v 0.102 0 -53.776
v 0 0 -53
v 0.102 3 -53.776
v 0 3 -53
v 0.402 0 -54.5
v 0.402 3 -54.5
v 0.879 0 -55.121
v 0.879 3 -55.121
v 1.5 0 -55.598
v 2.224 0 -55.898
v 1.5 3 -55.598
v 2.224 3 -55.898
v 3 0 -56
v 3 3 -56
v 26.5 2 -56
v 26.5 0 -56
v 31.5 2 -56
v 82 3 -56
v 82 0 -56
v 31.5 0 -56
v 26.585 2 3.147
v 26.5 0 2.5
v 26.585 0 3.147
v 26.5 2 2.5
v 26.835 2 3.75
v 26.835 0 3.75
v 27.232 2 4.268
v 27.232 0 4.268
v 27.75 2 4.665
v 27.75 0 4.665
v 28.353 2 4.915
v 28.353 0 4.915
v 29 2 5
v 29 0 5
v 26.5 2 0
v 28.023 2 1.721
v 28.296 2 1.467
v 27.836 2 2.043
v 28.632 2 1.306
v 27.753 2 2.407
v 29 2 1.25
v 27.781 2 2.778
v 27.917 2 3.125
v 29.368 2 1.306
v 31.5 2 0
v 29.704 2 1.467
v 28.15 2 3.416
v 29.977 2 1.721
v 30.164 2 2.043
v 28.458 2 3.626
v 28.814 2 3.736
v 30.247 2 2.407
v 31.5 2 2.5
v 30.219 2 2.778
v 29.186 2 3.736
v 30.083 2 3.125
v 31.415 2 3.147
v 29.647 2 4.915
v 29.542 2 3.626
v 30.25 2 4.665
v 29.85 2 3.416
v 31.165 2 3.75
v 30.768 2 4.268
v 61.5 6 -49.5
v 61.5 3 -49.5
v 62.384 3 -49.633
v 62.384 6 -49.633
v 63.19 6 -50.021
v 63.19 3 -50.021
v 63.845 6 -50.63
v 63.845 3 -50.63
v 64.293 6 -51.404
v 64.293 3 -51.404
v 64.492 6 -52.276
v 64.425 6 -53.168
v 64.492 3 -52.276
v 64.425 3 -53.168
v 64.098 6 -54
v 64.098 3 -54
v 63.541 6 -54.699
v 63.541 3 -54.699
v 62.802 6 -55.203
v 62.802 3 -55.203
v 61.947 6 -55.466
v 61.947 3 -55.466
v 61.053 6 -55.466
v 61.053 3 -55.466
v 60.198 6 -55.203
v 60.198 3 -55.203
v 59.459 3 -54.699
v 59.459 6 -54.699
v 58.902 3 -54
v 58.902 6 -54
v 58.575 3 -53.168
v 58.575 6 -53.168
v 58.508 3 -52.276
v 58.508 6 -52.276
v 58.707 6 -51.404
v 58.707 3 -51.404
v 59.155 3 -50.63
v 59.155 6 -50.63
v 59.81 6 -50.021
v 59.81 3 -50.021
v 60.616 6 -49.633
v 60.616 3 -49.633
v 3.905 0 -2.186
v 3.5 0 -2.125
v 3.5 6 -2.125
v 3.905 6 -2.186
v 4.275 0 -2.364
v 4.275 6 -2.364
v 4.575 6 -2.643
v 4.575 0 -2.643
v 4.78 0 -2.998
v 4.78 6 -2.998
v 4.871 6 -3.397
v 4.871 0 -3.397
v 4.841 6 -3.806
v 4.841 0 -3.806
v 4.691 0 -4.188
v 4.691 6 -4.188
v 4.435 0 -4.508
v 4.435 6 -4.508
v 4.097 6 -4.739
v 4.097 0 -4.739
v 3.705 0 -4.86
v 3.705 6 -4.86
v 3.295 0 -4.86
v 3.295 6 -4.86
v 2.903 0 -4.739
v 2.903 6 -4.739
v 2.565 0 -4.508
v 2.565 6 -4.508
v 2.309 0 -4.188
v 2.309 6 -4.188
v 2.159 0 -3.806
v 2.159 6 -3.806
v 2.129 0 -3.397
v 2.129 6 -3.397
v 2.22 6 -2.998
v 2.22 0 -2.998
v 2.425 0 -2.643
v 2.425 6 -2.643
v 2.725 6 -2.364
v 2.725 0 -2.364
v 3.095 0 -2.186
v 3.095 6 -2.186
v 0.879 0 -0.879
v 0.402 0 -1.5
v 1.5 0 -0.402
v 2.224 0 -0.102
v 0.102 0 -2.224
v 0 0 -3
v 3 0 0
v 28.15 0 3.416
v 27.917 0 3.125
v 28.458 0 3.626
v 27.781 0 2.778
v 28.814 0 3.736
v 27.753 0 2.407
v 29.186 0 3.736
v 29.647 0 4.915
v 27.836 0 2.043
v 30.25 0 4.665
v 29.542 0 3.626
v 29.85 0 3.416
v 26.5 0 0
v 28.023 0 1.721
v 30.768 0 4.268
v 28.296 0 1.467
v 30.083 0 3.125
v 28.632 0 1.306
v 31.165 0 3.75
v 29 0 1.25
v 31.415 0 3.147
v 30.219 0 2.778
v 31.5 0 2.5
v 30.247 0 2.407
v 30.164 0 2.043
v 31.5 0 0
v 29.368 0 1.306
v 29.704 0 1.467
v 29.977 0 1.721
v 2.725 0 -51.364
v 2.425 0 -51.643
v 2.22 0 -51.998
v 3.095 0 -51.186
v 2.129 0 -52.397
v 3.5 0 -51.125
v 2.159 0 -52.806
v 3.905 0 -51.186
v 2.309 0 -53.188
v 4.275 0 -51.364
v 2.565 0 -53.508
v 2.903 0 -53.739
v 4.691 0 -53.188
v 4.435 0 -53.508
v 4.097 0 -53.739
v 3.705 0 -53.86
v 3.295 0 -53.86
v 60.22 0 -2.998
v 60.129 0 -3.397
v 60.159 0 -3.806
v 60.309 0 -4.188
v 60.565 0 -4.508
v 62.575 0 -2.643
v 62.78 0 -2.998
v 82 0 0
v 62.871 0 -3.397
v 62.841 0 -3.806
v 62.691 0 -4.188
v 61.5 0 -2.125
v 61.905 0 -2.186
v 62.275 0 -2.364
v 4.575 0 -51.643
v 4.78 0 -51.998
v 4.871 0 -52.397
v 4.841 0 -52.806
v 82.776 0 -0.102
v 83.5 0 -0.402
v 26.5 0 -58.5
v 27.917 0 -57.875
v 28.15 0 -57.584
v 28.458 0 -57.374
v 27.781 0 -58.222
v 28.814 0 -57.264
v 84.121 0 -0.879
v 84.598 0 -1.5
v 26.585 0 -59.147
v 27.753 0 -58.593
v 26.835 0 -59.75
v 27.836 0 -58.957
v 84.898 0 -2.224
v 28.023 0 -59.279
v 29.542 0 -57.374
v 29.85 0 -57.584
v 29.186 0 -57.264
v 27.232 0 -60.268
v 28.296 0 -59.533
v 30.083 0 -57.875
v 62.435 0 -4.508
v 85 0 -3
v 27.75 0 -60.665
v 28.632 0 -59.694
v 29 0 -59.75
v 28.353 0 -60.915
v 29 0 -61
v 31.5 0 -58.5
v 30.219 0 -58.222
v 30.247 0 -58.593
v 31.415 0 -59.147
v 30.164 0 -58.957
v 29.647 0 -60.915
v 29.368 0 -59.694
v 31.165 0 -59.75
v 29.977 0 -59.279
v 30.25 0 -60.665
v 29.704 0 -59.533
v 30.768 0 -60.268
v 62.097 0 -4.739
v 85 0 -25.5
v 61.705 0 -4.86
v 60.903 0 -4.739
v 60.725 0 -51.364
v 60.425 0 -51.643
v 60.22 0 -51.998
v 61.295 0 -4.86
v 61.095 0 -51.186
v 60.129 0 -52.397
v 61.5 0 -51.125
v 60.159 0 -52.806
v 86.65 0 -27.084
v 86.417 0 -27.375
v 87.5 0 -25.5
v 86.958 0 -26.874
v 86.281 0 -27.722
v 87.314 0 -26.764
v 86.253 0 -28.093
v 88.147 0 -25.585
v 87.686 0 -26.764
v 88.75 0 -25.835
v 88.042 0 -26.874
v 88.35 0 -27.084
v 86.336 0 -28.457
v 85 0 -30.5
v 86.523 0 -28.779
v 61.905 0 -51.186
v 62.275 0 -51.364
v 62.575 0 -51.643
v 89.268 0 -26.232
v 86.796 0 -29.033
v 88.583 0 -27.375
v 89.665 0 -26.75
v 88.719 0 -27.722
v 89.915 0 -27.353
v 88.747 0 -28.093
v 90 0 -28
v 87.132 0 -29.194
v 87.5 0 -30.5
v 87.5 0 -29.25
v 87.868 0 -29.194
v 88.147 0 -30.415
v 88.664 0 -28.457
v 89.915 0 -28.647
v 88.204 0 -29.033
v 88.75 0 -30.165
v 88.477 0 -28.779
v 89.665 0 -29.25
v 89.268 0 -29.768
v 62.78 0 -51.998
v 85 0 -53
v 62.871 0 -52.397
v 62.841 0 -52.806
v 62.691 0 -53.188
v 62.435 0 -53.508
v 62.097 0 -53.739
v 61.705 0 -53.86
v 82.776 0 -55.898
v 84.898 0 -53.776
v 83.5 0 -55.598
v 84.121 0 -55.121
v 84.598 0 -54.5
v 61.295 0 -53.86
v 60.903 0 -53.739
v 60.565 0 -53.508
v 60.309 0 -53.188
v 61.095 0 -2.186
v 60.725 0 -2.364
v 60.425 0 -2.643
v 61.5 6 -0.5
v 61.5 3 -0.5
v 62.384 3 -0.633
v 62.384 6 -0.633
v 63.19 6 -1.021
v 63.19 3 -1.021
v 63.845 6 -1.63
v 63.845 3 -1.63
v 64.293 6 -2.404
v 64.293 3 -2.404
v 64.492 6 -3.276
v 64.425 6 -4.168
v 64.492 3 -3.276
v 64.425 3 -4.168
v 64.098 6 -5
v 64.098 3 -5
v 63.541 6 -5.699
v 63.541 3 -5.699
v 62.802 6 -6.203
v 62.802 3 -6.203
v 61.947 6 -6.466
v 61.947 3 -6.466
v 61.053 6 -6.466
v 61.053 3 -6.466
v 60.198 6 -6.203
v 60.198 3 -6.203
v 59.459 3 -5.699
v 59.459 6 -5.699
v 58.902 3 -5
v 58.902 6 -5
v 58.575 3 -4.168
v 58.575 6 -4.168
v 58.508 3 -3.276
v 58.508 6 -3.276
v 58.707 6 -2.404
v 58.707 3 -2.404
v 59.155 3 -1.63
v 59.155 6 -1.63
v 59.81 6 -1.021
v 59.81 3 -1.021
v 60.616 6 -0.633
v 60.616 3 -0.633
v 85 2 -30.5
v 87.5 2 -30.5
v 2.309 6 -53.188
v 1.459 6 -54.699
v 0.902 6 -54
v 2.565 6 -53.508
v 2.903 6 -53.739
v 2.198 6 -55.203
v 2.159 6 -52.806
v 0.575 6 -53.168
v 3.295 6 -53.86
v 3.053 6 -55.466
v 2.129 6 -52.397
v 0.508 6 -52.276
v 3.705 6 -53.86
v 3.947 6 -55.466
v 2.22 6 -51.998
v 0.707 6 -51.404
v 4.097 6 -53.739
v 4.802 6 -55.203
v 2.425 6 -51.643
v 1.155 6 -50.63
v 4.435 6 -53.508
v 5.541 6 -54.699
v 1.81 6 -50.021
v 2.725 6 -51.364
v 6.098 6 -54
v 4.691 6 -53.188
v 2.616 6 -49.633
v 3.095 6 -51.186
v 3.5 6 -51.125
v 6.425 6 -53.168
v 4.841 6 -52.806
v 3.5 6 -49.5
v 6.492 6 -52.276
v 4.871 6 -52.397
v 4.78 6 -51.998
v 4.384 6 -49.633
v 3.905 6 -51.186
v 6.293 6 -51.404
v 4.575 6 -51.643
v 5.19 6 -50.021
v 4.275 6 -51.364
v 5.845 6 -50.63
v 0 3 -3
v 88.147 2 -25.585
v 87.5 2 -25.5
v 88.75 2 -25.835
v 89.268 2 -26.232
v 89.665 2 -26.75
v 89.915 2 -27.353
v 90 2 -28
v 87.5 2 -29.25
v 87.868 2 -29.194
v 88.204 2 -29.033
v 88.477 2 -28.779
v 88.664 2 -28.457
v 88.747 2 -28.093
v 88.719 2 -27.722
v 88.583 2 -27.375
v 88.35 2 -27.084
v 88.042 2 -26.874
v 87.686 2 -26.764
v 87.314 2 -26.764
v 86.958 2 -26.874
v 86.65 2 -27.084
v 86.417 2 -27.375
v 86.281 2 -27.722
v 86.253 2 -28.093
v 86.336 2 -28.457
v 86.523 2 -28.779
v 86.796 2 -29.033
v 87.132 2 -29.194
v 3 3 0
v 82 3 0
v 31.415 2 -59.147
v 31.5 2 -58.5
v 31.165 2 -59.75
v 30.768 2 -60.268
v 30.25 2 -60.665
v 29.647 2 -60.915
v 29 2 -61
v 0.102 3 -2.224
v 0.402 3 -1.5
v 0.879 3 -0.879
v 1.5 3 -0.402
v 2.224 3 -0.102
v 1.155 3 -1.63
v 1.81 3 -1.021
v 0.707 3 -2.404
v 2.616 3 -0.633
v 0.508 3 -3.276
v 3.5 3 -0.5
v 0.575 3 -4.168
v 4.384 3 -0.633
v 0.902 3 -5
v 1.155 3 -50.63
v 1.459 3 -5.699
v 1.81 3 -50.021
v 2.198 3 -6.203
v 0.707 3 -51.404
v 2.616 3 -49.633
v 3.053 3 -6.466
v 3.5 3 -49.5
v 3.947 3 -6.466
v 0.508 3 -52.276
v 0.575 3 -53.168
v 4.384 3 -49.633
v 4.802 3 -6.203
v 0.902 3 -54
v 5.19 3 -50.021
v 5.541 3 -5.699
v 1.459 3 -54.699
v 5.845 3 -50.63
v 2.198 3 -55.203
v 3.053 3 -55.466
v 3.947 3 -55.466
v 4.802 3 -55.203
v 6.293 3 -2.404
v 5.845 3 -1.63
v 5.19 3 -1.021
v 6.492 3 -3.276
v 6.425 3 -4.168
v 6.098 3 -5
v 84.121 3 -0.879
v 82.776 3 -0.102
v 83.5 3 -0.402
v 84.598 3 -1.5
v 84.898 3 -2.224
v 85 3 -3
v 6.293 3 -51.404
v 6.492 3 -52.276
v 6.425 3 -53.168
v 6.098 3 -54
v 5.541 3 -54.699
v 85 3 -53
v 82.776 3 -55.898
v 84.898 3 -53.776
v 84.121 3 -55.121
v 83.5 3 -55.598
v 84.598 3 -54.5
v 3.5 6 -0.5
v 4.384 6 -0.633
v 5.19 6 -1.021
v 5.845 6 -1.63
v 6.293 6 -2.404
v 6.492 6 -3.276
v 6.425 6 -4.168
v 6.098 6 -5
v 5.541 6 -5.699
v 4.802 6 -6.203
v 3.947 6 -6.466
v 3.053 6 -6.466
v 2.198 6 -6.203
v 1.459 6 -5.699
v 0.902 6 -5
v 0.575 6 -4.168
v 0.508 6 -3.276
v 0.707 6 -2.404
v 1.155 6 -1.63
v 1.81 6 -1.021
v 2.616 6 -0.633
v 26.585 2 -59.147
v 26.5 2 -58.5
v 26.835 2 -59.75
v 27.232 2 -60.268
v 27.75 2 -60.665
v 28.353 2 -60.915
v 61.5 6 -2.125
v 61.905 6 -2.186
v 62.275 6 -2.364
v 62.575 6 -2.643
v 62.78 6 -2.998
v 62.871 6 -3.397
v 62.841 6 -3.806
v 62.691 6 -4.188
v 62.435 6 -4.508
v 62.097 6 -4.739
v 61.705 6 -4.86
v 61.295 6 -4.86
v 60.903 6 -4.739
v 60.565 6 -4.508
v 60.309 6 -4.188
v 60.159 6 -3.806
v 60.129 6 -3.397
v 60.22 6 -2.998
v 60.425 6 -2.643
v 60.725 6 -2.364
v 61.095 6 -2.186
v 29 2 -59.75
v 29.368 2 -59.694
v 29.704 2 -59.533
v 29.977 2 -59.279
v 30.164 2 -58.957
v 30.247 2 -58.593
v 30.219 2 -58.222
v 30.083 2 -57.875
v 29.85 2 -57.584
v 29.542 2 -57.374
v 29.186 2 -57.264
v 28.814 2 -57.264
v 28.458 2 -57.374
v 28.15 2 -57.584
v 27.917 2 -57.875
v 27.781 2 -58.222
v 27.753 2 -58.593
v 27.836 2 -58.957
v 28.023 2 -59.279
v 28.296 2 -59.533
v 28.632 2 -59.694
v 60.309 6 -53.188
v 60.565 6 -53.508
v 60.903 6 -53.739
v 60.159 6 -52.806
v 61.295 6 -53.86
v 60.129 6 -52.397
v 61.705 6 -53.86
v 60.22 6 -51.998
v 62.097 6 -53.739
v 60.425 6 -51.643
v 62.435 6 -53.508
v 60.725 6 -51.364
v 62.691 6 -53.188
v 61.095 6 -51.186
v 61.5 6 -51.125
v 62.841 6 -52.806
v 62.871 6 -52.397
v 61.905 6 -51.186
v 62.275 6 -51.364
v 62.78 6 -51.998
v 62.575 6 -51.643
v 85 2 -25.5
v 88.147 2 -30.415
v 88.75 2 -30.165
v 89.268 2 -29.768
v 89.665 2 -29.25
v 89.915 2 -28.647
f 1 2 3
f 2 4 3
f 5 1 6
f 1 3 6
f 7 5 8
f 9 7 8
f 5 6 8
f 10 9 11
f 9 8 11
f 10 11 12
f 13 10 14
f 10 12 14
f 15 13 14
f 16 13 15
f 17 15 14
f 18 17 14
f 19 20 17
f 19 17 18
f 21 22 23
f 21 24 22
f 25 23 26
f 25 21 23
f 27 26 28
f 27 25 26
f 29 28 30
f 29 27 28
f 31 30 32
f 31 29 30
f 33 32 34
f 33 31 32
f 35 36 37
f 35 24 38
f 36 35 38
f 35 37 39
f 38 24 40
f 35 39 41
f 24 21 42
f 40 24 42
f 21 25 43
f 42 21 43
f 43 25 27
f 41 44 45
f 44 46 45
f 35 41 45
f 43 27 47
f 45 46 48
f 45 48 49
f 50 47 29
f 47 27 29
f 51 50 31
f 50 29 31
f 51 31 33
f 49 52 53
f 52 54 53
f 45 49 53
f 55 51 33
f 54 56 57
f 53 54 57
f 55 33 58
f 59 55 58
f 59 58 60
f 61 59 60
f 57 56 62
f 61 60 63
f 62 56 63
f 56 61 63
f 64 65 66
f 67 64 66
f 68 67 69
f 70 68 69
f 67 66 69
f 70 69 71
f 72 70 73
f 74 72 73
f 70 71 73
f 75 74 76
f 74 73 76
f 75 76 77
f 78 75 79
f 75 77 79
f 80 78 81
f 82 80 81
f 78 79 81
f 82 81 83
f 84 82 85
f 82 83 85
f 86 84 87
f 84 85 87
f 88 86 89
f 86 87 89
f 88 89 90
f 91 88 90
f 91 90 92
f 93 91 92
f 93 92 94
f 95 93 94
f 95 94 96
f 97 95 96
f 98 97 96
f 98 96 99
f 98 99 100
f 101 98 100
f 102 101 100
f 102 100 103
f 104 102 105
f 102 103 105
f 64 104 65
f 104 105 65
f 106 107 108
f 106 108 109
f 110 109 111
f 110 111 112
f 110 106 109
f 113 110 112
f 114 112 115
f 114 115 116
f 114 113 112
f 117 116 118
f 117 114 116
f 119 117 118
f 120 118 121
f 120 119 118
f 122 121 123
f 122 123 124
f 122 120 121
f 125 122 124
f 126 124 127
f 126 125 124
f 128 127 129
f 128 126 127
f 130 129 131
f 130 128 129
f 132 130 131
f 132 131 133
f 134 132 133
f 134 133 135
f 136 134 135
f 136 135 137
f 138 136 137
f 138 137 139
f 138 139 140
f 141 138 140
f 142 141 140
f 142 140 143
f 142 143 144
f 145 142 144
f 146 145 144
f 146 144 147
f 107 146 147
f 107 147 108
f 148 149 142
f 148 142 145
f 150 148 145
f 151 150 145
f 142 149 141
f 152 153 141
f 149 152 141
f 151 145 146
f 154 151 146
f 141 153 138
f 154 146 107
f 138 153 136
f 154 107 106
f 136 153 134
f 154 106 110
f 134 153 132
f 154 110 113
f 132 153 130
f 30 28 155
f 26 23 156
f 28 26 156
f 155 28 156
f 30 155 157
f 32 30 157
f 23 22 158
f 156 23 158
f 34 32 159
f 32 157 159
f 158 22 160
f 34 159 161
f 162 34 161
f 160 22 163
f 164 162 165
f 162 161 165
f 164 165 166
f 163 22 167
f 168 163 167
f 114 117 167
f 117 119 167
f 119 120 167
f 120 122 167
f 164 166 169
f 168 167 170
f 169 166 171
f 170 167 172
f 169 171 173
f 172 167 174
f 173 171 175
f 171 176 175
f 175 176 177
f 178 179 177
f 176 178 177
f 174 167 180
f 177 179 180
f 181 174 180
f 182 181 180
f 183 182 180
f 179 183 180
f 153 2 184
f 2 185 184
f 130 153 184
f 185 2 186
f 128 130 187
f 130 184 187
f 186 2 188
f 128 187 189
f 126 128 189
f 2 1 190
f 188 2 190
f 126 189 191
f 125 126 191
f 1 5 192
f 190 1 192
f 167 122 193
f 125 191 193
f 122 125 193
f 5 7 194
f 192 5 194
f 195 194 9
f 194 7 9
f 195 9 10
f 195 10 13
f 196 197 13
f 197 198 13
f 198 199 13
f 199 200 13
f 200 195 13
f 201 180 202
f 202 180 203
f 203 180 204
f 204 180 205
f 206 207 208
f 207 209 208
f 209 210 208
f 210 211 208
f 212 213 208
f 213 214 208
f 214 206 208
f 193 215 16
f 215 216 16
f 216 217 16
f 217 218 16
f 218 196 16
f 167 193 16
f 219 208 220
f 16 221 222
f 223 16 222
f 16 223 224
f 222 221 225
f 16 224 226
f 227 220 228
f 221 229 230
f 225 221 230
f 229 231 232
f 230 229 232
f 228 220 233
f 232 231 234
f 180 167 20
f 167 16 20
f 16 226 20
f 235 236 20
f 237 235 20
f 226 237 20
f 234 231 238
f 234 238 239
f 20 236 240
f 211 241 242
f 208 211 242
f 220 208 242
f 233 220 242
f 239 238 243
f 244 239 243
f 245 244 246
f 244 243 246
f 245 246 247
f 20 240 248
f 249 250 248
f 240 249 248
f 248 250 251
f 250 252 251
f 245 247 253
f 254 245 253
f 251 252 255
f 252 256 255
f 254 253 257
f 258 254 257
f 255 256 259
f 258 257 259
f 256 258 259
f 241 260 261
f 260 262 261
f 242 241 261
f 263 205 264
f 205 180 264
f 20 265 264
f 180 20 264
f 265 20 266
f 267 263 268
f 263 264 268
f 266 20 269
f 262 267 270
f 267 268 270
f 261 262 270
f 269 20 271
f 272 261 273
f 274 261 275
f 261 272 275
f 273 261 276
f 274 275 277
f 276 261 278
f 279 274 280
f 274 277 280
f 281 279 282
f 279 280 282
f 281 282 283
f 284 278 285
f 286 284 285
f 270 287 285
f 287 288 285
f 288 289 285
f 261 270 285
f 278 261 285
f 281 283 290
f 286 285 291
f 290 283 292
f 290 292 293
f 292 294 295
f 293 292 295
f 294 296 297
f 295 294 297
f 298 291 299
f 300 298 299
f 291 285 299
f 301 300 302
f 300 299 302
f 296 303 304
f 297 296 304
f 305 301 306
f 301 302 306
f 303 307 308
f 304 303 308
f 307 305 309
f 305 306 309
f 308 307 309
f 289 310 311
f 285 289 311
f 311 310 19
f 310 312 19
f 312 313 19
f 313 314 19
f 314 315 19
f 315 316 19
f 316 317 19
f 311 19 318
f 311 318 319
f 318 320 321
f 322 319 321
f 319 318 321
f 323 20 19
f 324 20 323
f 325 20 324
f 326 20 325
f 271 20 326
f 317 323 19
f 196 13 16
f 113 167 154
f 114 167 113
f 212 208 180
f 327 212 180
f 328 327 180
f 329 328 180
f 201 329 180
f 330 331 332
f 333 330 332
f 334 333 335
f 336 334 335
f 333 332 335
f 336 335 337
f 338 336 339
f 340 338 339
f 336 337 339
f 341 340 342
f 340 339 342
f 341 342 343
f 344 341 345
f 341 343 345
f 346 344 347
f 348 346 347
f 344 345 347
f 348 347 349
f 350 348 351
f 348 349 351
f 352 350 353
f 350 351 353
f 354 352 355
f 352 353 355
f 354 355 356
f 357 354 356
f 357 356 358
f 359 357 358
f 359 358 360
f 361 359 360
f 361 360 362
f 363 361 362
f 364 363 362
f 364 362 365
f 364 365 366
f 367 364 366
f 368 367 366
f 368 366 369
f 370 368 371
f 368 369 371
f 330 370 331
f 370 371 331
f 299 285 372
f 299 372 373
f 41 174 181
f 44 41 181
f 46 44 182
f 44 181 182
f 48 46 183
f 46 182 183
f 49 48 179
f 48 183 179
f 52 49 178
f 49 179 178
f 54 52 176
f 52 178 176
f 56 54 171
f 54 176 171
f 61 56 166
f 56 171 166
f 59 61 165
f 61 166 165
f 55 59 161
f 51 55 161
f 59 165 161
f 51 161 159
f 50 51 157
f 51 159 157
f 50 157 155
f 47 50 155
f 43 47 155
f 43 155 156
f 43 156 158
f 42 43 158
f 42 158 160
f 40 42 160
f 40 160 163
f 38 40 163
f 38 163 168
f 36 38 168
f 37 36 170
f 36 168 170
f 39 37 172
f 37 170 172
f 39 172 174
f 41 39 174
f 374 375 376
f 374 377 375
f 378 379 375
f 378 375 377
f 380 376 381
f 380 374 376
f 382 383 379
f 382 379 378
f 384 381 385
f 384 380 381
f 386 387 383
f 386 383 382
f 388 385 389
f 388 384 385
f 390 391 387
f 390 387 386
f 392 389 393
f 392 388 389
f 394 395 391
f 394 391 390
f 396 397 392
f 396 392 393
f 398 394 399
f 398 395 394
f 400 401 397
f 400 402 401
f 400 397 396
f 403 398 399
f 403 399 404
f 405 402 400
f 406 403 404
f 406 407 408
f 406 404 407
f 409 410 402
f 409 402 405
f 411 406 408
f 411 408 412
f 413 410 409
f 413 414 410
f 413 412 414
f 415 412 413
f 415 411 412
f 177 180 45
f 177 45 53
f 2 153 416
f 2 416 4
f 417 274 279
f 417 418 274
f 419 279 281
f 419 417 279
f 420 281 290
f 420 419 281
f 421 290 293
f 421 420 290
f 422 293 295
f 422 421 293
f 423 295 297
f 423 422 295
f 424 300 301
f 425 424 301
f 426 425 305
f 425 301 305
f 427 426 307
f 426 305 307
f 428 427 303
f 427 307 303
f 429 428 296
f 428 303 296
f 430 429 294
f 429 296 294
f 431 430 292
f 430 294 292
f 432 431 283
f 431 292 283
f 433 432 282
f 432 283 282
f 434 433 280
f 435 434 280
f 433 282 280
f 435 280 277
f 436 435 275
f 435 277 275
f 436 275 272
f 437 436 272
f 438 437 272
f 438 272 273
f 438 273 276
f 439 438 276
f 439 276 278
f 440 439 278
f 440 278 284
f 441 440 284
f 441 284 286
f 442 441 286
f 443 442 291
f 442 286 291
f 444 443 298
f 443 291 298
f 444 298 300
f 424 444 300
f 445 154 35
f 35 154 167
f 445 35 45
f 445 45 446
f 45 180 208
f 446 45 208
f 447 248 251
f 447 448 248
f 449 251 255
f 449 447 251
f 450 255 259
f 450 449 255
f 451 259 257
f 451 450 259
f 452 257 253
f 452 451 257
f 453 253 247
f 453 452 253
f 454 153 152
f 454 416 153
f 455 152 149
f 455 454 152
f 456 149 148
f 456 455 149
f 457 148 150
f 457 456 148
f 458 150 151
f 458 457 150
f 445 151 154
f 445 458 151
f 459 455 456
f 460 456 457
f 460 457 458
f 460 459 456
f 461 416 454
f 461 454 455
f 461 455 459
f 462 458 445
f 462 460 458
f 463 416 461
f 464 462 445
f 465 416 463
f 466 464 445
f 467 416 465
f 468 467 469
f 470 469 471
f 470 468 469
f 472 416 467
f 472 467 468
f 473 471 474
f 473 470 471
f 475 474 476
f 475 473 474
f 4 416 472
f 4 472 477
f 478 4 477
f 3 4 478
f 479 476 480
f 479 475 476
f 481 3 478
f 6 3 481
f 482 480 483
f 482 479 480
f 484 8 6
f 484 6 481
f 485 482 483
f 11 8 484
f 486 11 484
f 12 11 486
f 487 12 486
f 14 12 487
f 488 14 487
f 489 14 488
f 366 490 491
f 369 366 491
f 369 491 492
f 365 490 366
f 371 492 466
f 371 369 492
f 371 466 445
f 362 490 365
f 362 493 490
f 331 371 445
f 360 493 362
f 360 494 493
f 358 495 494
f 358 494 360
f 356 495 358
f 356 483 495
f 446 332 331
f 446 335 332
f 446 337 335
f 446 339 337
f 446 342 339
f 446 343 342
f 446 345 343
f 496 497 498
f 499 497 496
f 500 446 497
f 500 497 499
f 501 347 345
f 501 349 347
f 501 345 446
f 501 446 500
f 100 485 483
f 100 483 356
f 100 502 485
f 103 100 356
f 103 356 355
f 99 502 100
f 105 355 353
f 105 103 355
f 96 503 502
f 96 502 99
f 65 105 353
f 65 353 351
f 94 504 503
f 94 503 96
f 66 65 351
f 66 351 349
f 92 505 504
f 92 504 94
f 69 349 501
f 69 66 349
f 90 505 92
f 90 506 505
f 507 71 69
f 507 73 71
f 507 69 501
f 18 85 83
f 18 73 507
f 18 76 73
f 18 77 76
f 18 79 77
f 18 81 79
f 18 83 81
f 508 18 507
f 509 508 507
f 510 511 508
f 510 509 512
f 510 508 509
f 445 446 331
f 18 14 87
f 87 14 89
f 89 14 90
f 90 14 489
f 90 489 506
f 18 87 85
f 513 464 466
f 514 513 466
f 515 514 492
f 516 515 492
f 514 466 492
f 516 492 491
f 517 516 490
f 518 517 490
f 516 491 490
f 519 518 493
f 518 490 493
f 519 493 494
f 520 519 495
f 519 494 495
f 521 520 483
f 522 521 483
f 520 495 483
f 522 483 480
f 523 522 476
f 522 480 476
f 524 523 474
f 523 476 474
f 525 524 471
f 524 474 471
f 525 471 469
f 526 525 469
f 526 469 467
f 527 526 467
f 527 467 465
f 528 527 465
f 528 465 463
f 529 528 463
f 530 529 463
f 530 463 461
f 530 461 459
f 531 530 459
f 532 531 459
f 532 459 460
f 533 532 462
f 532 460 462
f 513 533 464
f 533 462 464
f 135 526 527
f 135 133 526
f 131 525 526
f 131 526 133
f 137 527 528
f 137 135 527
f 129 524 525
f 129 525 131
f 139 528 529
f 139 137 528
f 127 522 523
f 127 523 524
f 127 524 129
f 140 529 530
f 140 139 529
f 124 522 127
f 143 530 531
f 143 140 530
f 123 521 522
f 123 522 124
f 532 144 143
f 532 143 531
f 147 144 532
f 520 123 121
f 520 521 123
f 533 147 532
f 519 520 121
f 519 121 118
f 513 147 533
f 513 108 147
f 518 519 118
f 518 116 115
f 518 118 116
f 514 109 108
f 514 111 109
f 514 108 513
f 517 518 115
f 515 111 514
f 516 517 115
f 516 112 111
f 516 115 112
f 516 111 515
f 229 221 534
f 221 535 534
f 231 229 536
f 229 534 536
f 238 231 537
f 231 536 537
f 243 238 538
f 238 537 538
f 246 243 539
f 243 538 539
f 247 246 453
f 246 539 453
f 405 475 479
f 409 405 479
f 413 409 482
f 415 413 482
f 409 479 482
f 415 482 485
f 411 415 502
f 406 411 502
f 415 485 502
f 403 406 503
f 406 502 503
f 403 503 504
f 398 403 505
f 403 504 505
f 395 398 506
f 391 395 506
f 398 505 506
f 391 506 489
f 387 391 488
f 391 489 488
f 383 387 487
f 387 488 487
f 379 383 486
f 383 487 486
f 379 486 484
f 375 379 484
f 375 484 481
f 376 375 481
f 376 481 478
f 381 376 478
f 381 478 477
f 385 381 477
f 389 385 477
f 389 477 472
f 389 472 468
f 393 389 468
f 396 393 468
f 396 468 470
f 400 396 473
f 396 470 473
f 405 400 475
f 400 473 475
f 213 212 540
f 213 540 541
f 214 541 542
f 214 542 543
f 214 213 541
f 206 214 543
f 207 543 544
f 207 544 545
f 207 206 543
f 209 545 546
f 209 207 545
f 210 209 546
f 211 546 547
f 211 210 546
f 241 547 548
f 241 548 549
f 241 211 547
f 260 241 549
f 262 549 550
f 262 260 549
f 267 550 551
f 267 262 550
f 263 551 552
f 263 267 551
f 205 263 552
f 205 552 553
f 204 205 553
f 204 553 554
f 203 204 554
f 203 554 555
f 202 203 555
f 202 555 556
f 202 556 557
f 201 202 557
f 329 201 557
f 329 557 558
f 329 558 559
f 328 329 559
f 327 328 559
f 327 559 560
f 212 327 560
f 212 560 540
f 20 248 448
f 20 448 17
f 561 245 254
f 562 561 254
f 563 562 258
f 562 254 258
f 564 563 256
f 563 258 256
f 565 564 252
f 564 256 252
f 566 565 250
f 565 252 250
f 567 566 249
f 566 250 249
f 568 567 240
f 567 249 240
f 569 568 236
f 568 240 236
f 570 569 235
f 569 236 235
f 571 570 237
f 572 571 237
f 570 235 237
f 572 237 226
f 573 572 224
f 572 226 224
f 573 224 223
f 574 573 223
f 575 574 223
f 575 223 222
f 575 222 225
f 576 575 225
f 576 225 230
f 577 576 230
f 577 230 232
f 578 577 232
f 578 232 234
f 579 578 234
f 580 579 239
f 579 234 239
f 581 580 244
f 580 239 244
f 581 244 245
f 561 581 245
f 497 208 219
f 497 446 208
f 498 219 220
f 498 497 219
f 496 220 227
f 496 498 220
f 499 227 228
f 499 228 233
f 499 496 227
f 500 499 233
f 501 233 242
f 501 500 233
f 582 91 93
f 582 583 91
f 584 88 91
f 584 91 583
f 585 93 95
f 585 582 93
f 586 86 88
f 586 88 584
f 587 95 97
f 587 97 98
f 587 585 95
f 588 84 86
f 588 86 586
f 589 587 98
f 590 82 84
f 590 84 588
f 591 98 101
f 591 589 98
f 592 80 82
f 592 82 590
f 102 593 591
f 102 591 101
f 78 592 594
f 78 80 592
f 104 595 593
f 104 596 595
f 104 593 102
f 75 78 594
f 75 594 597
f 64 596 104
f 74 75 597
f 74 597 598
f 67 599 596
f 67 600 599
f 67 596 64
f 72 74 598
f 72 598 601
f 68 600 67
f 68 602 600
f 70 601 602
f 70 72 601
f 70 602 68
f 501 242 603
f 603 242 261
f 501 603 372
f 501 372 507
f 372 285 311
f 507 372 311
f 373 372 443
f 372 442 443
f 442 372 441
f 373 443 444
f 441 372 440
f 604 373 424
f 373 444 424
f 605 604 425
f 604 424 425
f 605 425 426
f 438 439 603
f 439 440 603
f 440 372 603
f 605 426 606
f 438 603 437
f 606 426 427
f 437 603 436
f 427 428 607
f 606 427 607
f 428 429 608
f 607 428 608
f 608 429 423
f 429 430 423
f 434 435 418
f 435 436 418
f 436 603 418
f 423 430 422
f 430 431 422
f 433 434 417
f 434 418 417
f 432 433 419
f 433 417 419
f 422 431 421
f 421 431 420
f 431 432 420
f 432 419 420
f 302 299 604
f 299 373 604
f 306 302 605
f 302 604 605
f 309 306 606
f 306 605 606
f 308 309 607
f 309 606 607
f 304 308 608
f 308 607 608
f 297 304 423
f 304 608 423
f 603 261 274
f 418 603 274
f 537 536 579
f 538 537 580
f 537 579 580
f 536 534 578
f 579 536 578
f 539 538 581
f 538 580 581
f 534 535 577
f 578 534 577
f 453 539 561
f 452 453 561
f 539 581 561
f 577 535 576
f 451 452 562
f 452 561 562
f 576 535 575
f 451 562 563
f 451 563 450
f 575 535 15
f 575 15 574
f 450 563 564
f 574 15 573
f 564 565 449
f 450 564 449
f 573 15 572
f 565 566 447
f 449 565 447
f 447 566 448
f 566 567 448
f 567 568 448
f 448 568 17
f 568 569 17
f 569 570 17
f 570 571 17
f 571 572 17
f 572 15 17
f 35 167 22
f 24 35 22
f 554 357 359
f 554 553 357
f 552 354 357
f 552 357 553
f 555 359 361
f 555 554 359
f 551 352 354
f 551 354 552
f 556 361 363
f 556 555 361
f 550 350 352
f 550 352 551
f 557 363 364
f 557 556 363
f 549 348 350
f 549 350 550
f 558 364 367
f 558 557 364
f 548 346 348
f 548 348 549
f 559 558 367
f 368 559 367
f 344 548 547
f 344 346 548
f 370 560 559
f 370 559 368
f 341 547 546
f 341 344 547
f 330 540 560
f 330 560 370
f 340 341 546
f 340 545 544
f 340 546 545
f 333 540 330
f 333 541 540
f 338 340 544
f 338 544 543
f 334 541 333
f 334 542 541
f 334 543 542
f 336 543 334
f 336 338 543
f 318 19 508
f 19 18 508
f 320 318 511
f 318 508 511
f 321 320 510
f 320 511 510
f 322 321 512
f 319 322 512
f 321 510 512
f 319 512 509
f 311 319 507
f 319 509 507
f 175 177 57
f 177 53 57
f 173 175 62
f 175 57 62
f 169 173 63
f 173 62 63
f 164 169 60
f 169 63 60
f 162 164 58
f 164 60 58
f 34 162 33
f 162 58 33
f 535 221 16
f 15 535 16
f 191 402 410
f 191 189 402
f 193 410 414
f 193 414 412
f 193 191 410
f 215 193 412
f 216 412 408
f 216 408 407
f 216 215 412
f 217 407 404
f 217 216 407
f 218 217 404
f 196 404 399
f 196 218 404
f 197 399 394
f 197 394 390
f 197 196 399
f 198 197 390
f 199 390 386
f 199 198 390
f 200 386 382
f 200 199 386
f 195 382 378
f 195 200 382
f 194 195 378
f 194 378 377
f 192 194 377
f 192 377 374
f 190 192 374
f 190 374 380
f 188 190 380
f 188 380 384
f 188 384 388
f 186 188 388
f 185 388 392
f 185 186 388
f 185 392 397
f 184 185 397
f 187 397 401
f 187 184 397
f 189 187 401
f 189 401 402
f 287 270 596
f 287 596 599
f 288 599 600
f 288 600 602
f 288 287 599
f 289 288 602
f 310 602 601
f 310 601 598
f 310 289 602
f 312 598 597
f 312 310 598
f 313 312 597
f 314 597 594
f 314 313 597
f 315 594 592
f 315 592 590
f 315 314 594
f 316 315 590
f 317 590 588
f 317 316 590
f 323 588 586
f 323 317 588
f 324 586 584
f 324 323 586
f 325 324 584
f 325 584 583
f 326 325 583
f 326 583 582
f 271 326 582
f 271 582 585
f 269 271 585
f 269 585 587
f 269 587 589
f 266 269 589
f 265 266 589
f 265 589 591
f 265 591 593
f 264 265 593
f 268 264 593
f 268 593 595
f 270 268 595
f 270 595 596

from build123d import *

# Parameters (mm, degrees)
SKETCH1_W           = 85
SKETCH1_H           = 56
SKETCH1_R           = 1.375
BOSS_EXTRUDE1_DEPTH = 3
FILLET1_R           = 3
SKETCH3_R           = 3
SKETCH3_R_2         = 1.375
BOSS_EXTRUDE3_DEPTH = 3
SKETCH5_W           = 5
SKETCH5_H           = 5
SKETCH5_R           = 1.25
BOSS_EXTRUDE4_DEPTH = 2
FILLET2_R           = 2.5
SKETCH6_W           = 5
SKETCH6_H           = 5
SKETCH6_R           = 1.25
BOSS_EXTRUDE5_DEPTH = 2
FILLET3_R           = 2.5
SKETCH8_W           = 5
SKETCH8_H           = 5
SKETCH8_R           = 1.25
BOSS_EXTRUDE7_DEPTH = 2
FILLET5_R           = 2.5


with BuildPart() as part:
    # Sketch1 → Boss-Extrude1 (new body)
    with BuildSketch(Plane(origin=(0, 0, 0), x_dir=(1, 0, 0), z_dir=(0, 1, 0))):
        with Locations((42.5, 28)):
            Rectangle(SKETCH1_W, SKETCH1_H)
        with Locations(Location((3.5, 52.5, 0), (0, 0, 270))):
            Circle(SKETCH1_R, mode=Mode.SUBTRACT)
        with Locations(Location((61.5, 52.5, 0), (0, 0, 270))):
            Circle(SKETCH1_R, mode=Mode.SUBTRACT)
        with Locations(Location((3.5, 3.5, 0), (0, 0, 270))):
            Circle(SKETCH1_R, mode=Mode.SUBTRACT)
        with Locations(Location((61.5, 3.5, 0), (0, 0, 270))):
            Circle(SKETCH1_R, mode=Mode.SUBTRACT)
    extrude(amount=BOSS_EXTRUDE1_DEPTH)

    # Fillet1
    fillet1_edges = [part.edges().sort_by_distance(p)[0] for p in [
        (0, 1.5, -56),
        (85, 1.5, -56),
        (85, 1.5, 0),
        (0, 1.5, 0),
    ]]
    fillet(fillet1_edges, radius=FILLET1_R)

    # Sketch3 → Boss-Extrude3 (add)
    # profile 1 of 4: a face of its own
    with BuildSketch(Plane(origin=(0, 3, 0), x_dir=(1, 0, 0), z_dir=(0, 1, 0))):
        with Locations(Location((3.5, 52.5, 0), (0, 0, 270))):
            Circle(SKETCH3_R)
        with Locations(Location((3.5, 52.5, 0), (0, 0, 270))):
            Circle(SKETCH3_R_2, mode=Mode.SUBTRACT)
    # profile 2 of 4: a face of its own
    with BuildSketch(Plane(origin=(0, 3, 0), x_dir=(1, 0, 0), z_dir=(0, 1, 0))):
        with Locations(Location((61.5, 52.5, 0), (0, 0, 270))):
            Circle(SKETCH3_R)
        with Locations(Location((61.5, 52.5, 0), (0, 0, 270))):
            Circle(SKETCH3_R_2, mode=Mode.SUBTRACT)
    # profile 3 of 4: a face of its own
    with BuildSketch(Plane(origin=(0, 3, 0), x_dir=(1, 0, 0), z_dir=(0, 1, 0))):
        with Locations(Location((3.5, 3.5, 0), (0, 0, 270))):
            Circle(SKETCH3_R)
        with Locations(Location((3.5, 3.5, 0), (0, 0, 270))):
            Circle(SKETCH3_R_2, mode=Mode.SUBTRACT)
    # profile 4 of 4: a face of its own
    with BuildSketch(Plane(origin=(0, 3, 0), x_dir=(1, 0, 0), z_dir=(0, 1, 0))):
        with Locations(Location((61.5, 3.5, 0), (0, 0, 270))):
            Circle(SKETCH3_R)
        with Locations(Location((61.5, 3.5, 0), (0, 0, 270))):
            Circle(SKETCH3_R_2, mode=Mode.SUBTRACT)
    extrude(amount=BOSS_EXTRUDE3_DEPTH)

    # Sketch5 → Boss-Extrude4 (add)
    with BuildSketch(Plane.XZ):
        with Locations((29, 2.5)):
            Rectangle(SKETCH5_W, SKETCH5_H)
        with Locations(Location((29, 2.5, 0), (0, 0, 270))):
            Circle(SKETCH5_R, mode=Mode.SUBTRACT)
    extrude(amount=-BOSS_EXTRUDE4_DEPTH)

    # Fillet2
    fillet2_edges = [part.edges().sort_by_distance(p)[0] for p in [
        (26.5, 1, 5),
        (31.5, 1, 5),
    ]]
    fillet(fillet2_edges, radius=FILLET2_R - 0.0001)  # a hair under: the kernel refuses the full size

    # Sketch6 → Boss-Extrude5 (add)
    with BuildSketch(Plane.XZ):
        with Locations((29, -58.5)):
            Rectangle(SKETCH6_W, SKETCH6_H)
        with Locations(Location((29, -58.5, 0), (0, 0, 270))):
            Circle(SKETCH6_R, mode=Mode.SUBTRACT)
    extrude(amount=-BOSS_EXTRUDE5_DEPTH)

    # Fillet3
    fillet3_edges = [part.edges().sort_by_distance(p)[0] for p in [
        (31.5, 1, -61),
        (26.5, 1, -61),
    ]]
    fillet(fillet3_edges, radius=FILLET3_R - 0.0001)  # a hair under: the kernel refuses the full size

    # Sketch8 → Boss-Extrude7 (add)
    with BuildSketch(Plane.XZ):
        with Locations((87.5, -28)):
            Rectangle(SKETCH8_W, SKETCH8_H)
        with Locations(Location((87.5, -28, 0), (0, 0, 270))):
            Circle(SKETCH8_R, mode=Mode.SUBTRACT)
    extrude(amount=-BOSS_EXTRUDE7_DEPTH)

    # Fillet5
    fillet5_edges = [part.edges().sort_by_distance(p)[0] for p in [
        (90, 1, -30.5),
        (90, 1, -25.5),
    ]]
    fillet(fillet5_edges, radius=FILLET5_R - 0.0001)  # a hair under: the kernel refuses the full size


solid = part.part
